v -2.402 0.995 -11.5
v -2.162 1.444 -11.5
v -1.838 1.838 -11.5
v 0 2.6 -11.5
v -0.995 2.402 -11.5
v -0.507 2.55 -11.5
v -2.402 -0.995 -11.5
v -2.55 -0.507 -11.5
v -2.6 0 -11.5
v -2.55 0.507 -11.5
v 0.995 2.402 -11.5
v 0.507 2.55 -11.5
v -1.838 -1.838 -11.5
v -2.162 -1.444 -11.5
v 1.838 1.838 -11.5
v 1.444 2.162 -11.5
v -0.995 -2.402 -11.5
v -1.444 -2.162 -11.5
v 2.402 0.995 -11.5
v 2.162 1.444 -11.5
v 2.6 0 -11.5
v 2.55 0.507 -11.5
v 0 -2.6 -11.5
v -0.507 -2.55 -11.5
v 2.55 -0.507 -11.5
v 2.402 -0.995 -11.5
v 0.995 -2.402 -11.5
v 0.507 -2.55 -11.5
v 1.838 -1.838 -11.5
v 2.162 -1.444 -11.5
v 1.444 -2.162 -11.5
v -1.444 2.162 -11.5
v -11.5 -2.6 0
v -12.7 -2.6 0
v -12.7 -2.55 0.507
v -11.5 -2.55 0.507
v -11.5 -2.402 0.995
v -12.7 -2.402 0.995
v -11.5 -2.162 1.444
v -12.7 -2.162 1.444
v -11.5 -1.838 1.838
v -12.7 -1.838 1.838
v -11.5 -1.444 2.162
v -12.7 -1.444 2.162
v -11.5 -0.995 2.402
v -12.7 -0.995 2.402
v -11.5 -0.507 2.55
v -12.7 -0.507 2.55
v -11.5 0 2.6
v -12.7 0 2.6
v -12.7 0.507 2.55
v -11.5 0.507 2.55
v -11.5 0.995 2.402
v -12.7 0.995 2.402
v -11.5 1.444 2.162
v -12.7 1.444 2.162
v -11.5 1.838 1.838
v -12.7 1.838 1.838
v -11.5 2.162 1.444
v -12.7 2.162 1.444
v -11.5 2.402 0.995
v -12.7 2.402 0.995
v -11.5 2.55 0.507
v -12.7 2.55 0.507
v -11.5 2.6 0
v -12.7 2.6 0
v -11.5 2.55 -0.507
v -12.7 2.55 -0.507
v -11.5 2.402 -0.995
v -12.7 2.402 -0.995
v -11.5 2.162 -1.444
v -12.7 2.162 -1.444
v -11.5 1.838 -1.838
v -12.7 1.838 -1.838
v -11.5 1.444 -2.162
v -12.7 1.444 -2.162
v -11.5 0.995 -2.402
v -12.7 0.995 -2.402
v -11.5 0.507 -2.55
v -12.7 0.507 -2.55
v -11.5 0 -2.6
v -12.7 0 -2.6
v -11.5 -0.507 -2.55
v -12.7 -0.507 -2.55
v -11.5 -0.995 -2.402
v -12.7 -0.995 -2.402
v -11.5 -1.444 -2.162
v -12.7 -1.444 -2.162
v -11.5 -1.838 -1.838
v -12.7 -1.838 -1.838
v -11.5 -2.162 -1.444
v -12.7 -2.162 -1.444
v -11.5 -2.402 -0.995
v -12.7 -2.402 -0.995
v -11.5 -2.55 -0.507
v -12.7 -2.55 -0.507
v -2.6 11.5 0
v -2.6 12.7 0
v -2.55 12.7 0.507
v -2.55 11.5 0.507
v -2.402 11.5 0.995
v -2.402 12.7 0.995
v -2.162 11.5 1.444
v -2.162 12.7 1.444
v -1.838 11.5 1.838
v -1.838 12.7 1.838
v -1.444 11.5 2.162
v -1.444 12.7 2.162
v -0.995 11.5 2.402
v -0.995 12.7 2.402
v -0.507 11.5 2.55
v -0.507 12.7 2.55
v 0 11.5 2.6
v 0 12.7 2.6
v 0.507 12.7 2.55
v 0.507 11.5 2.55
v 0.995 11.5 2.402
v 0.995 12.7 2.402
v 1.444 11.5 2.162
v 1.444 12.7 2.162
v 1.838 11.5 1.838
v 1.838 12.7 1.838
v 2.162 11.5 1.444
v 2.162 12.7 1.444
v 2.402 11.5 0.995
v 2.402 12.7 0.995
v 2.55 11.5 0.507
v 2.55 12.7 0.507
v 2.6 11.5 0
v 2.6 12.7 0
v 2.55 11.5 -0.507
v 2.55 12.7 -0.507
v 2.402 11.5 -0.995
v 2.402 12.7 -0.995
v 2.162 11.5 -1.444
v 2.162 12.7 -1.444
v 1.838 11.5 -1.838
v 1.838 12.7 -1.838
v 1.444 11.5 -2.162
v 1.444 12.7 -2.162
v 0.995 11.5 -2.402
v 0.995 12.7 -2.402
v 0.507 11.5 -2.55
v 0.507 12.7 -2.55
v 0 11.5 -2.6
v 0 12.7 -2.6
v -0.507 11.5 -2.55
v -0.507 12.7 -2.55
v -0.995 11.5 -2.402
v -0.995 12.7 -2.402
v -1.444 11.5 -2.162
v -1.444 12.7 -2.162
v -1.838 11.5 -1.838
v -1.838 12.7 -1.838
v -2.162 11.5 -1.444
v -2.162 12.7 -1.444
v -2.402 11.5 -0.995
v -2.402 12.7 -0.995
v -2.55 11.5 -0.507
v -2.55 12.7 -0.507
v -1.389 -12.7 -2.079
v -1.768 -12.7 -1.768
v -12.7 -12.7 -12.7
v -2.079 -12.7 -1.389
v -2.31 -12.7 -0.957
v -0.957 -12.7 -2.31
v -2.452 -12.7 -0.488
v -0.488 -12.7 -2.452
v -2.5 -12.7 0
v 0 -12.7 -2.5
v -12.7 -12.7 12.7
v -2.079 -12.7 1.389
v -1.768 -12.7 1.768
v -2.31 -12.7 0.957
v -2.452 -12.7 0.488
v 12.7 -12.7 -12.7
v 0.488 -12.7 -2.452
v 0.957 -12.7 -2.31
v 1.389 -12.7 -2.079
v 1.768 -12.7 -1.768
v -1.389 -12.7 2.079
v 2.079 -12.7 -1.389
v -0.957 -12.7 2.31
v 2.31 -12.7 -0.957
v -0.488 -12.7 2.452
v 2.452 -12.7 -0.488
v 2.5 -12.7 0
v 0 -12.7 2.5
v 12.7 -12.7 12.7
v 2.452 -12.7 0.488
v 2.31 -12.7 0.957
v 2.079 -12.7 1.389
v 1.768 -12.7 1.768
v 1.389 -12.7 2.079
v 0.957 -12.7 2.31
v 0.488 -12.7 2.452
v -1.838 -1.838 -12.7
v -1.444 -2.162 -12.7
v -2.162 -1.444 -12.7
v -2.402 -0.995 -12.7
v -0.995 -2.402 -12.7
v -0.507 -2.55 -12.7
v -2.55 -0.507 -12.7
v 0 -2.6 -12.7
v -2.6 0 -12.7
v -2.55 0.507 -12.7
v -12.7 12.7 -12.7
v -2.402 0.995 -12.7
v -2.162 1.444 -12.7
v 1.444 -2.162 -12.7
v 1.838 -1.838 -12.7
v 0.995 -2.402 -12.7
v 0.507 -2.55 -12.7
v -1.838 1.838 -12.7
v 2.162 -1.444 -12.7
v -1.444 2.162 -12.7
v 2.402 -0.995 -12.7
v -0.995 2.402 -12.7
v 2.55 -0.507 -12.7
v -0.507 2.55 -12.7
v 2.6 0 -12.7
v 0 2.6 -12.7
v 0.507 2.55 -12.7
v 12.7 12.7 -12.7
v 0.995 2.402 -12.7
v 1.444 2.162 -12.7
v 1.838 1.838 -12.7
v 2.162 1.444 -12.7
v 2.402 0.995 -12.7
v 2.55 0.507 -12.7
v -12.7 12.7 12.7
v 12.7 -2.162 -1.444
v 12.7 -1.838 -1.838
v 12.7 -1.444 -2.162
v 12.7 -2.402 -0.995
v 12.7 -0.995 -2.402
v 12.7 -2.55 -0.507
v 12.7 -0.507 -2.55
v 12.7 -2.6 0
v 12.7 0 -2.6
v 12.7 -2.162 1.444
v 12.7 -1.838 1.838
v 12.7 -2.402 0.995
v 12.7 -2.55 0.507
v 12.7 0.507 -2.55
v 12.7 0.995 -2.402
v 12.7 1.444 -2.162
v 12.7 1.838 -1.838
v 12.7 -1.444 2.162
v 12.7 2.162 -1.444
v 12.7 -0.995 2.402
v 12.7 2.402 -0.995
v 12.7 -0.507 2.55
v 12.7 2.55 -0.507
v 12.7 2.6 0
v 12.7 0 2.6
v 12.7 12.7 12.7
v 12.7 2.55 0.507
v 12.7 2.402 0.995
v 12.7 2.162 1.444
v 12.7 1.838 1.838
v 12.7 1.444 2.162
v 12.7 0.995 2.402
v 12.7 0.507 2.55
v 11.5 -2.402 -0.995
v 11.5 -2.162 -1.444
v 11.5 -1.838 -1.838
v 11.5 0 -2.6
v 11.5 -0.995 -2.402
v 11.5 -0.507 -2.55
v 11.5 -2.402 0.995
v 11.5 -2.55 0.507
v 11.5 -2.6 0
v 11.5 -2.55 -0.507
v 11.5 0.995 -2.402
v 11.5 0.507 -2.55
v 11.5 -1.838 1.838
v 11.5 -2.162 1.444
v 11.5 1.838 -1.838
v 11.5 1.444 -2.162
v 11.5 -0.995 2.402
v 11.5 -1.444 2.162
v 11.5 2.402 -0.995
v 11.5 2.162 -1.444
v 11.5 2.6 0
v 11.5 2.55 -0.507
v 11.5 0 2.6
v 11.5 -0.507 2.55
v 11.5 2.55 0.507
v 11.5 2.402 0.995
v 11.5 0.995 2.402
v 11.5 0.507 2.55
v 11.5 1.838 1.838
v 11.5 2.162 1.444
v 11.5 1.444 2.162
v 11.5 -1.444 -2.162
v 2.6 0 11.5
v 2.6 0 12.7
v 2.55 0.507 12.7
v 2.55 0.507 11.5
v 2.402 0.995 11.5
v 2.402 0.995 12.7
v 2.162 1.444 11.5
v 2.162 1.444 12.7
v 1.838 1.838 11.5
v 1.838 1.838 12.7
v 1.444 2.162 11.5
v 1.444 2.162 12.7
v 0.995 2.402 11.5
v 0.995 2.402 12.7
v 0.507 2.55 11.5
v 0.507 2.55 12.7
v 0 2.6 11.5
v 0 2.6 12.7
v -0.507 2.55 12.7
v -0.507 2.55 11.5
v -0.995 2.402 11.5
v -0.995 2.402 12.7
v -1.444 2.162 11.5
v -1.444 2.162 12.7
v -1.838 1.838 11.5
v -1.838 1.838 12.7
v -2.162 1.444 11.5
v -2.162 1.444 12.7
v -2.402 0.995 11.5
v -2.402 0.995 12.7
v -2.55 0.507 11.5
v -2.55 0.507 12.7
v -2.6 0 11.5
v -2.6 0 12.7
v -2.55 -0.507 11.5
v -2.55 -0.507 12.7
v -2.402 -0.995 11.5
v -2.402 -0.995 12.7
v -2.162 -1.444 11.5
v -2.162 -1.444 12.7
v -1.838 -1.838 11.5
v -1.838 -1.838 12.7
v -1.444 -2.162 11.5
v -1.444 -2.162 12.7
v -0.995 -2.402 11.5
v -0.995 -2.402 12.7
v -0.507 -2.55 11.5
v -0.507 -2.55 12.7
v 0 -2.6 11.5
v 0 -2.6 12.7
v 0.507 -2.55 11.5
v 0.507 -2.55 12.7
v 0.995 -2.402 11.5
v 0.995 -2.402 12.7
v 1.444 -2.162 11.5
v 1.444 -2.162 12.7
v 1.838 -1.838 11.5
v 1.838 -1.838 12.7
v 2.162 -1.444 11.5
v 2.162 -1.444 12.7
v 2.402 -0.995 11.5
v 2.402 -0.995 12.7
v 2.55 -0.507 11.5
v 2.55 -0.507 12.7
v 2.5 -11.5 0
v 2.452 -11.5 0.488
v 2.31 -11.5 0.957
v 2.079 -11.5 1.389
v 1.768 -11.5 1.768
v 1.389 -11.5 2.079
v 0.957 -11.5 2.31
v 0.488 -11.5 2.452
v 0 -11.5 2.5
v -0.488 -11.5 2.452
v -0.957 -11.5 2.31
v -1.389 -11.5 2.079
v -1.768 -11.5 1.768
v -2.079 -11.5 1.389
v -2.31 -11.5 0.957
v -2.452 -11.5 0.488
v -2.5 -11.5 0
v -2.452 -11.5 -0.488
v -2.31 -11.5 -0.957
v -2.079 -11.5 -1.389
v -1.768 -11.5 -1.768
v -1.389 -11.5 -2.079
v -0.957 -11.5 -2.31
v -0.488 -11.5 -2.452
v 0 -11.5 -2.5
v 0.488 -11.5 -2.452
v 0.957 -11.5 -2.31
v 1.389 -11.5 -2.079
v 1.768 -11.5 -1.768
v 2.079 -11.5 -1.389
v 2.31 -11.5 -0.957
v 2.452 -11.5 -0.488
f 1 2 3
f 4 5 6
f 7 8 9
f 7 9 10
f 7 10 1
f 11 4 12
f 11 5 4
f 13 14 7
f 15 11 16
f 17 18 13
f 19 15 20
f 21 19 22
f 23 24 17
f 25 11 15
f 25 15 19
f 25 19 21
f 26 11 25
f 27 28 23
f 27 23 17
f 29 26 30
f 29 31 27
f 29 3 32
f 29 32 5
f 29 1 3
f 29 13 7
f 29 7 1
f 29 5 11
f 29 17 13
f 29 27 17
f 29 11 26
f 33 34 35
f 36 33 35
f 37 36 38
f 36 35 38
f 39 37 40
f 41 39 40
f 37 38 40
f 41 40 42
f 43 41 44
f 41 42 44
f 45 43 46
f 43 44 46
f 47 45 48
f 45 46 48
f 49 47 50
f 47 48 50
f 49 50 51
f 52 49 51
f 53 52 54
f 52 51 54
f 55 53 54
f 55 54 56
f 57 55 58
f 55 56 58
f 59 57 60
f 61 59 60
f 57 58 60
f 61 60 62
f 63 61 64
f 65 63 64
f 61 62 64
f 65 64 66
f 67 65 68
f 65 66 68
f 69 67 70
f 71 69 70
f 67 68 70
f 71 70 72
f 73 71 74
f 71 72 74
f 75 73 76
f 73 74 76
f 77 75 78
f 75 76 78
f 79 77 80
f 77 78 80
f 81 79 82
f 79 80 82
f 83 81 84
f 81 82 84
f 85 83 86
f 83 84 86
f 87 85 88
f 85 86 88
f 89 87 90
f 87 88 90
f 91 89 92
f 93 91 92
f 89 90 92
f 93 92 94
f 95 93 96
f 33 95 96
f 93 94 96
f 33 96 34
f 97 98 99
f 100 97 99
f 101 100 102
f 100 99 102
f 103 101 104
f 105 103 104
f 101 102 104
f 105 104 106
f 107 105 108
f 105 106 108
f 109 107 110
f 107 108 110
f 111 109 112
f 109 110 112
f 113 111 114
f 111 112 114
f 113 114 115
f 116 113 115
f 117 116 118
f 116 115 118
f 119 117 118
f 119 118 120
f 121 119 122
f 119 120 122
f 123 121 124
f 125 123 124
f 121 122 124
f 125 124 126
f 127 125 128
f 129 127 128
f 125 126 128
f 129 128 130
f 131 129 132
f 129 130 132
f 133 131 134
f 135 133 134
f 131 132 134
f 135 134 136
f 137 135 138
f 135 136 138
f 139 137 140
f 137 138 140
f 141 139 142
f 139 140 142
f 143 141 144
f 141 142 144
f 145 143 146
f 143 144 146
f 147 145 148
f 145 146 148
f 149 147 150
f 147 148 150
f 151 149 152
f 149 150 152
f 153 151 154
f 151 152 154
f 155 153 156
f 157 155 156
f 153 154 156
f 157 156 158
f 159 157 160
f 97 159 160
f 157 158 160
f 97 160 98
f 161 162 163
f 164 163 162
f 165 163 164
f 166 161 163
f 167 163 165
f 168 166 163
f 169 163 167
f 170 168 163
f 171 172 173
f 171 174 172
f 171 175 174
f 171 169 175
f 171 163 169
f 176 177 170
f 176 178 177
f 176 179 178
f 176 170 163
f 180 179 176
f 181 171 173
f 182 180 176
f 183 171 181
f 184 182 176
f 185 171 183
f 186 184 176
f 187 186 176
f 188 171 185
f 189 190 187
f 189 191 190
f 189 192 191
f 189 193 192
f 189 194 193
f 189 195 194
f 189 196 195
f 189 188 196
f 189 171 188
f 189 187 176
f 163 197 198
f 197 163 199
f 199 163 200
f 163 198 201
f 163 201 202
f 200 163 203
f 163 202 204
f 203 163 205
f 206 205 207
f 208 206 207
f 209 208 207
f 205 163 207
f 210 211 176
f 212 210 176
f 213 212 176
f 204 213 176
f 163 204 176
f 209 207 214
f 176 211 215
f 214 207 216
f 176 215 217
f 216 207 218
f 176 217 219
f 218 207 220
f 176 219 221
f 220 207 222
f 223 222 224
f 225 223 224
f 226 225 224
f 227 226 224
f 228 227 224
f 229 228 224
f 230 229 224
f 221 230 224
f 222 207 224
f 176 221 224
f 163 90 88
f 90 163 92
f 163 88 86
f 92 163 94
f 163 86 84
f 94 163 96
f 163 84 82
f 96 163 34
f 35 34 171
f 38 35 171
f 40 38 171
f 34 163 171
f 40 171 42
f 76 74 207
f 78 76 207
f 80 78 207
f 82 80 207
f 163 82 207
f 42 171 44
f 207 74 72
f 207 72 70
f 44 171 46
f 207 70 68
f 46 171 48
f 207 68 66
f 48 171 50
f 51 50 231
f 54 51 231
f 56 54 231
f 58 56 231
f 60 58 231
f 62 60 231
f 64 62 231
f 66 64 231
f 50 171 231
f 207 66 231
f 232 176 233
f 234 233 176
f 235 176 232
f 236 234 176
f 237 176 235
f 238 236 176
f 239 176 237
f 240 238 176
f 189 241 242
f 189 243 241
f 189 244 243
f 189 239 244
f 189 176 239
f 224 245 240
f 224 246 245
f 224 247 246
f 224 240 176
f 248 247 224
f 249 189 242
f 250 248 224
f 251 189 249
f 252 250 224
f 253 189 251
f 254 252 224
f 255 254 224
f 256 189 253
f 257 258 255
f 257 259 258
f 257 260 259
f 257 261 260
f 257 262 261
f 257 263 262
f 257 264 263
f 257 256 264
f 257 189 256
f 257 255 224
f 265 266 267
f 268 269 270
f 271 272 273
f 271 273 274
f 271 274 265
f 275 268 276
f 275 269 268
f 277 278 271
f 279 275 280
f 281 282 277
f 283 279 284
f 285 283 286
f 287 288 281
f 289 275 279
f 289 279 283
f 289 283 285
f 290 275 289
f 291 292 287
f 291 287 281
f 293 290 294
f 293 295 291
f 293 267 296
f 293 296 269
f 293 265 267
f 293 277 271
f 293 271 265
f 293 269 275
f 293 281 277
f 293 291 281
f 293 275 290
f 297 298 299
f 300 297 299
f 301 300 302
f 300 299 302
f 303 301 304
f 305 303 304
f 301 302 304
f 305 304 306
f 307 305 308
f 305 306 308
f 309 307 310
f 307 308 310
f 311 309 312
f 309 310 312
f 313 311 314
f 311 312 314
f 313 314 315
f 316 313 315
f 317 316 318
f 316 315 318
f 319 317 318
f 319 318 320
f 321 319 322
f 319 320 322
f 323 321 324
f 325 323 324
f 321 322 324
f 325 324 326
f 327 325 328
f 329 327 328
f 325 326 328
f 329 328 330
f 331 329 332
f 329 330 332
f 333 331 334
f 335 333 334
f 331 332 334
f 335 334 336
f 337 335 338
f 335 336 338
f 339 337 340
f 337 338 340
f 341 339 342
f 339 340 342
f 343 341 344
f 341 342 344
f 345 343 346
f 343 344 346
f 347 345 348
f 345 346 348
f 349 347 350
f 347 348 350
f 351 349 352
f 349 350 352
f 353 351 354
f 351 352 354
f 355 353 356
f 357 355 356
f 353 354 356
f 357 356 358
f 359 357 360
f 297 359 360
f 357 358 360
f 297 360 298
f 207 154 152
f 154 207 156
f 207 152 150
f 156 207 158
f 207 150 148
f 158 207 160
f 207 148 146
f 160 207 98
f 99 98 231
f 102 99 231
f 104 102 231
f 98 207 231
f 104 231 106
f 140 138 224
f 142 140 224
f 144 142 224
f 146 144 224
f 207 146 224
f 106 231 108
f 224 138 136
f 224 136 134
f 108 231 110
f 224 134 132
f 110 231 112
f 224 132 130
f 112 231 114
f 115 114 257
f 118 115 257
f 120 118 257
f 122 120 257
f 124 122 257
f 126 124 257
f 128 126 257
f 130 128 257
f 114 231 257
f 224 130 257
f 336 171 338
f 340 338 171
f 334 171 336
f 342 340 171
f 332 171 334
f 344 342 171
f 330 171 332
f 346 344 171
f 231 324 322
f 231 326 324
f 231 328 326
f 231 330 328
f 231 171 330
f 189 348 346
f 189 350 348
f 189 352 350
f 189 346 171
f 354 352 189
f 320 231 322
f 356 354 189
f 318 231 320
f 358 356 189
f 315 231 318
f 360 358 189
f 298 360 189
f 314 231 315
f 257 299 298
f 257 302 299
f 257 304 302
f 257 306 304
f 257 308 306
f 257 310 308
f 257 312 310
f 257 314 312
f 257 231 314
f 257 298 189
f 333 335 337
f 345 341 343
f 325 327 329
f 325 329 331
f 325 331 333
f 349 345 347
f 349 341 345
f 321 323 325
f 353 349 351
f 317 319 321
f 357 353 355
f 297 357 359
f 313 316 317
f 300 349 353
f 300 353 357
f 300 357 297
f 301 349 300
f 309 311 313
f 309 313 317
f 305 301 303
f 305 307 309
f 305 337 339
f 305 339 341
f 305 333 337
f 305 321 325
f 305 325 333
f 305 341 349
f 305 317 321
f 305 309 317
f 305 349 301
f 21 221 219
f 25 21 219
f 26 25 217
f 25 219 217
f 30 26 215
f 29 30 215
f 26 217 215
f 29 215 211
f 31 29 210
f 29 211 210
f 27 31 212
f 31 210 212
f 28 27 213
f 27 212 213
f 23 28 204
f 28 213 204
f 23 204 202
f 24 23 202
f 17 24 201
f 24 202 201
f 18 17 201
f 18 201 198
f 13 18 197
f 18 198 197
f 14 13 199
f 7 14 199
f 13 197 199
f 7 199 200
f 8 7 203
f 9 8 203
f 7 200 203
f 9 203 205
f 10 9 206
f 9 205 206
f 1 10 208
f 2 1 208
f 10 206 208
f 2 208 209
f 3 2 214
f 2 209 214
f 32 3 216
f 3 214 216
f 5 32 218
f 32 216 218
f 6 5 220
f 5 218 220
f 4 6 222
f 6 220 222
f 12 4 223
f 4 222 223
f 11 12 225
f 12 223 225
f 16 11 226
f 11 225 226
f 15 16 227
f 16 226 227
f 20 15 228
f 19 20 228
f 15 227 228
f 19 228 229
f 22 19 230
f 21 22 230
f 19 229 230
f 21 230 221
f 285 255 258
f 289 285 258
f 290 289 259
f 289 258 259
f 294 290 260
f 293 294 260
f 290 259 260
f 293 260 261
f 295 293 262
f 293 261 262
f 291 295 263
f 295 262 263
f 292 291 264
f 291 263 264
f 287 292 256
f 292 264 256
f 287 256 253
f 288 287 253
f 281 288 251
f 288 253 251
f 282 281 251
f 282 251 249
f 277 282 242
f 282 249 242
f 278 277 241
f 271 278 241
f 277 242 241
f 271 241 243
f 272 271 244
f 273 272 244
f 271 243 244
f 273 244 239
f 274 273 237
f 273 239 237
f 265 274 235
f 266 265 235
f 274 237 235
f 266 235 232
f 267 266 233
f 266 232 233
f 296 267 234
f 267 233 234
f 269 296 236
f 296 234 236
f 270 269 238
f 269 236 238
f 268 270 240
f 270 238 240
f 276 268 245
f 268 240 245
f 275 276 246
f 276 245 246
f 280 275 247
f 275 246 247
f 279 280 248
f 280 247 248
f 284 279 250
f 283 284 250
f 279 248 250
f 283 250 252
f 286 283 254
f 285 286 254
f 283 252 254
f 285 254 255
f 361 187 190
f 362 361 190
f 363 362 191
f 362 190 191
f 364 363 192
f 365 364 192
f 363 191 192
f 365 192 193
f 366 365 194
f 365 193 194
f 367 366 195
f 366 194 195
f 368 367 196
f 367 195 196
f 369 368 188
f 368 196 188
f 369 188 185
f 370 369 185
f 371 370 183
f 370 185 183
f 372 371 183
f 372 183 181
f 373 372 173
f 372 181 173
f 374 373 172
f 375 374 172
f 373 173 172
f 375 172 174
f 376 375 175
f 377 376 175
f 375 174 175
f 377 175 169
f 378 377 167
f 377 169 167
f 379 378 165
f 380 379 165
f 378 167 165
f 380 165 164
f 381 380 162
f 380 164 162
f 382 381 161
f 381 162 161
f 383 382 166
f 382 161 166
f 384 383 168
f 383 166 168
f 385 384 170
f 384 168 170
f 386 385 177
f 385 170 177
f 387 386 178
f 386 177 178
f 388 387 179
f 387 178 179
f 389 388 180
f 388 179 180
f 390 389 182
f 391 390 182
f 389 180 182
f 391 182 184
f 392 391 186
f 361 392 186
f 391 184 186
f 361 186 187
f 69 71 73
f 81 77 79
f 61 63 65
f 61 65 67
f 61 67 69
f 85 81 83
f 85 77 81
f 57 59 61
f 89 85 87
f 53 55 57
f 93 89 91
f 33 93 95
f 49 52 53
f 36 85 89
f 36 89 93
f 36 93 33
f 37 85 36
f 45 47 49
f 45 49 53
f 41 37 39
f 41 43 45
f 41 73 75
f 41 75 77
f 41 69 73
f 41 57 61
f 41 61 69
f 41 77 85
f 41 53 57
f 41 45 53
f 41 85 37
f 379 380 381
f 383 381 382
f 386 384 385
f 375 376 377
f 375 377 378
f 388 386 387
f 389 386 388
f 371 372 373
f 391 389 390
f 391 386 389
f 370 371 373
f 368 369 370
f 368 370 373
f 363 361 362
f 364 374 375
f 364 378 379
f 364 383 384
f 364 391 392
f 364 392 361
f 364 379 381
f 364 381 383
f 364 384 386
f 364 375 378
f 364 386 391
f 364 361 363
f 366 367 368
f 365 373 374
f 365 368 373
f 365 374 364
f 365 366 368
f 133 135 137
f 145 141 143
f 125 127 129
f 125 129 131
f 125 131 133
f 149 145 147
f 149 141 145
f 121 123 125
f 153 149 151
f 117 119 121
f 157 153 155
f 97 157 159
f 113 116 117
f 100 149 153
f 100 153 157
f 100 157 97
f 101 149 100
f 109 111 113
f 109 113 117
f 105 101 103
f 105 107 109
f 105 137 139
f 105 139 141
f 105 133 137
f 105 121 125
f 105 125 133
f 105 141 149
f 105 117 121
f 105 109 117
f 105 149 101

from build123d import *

# Parameters (mm, degrees)
F0_W      = 25.4
F0_H      = 25.4
F1_DEPTH  = 12.7
F7_R      = 2.6
F8_DEPTH  = 1.2
F6_R      = 2.6
F9_DEPTH  = 1.2
F5_R      = 2.6
F10_DEPTH = 1.2
F4_R      = 2.6
F11_DEPTH = 1.2
F2_R      = 2.5
F12_DEPTH = 1.2
F3_R      = 2.6
F13_DEPTH = 1.2


with BuildPart() as f1:
    # F0 (on Top) → F1 (new body, symmetric)
    with BuildSketch(Plane.XY):
        Rectangle(F0_W, F0_H)
    extrude(amount=F1_DEPTH, both=True)

    # F7 (on face) → F8 (cut)
    with BuildSketch(Plane(origin=(0, 12.7, 0), x_dir=(-1, 0, 0), z_dir=(0, 1, 0))):
        Circle(F7_R)
    extrude(amount=-F8_DEPTH, mode=Mode.SUBTRACT)

    # F6 (on face) → F9 (cut)
    with BuildSketch(Plane(origin=(0, 0, -12.7), x_dir=(1, 0, 0), z_dir=(0, 0, -1))):
        Circle(F6_R)
    extrude(amount=-F9_DEPTH, mode=Mode.SUBTRACT)

    # F5 (on face) → F10 (cut)
    with BuildSketch(Plane(origin=(-12.7, 0, 0), x_dir=(0, -1, 0), z_dir=(-1, 0, 0))):
        Circle(F5_R)
    extrude(amount=-F10_DEPTH, mode=Mode.SUBTRACT)

    # F4 (on face) → F11 (cut)
    with BuildSketch(Plane.XY.offset(12.7)):
        Circle(F4_R)
    extrude(amount=-F11_DEPTH, mode=Mode.SUBTRACT)

    # F2 (on face) → F12 (cut)
    with BuildSketch(Plane.XZ.offset(12.7)):
        Circle(F2_R)
    extrude(amount=-F12_DEPTH, mode=Mode.SUBTRACT)

    # F3 (on face) → F13 (cut)
    with BuildSketch(Plane.YZ.offset(12.7)):
        Circle(F3_R)
    extrude(amount=-F13_DEPTH, mode=Mode.SUBTRACT)


solid = f1.part
